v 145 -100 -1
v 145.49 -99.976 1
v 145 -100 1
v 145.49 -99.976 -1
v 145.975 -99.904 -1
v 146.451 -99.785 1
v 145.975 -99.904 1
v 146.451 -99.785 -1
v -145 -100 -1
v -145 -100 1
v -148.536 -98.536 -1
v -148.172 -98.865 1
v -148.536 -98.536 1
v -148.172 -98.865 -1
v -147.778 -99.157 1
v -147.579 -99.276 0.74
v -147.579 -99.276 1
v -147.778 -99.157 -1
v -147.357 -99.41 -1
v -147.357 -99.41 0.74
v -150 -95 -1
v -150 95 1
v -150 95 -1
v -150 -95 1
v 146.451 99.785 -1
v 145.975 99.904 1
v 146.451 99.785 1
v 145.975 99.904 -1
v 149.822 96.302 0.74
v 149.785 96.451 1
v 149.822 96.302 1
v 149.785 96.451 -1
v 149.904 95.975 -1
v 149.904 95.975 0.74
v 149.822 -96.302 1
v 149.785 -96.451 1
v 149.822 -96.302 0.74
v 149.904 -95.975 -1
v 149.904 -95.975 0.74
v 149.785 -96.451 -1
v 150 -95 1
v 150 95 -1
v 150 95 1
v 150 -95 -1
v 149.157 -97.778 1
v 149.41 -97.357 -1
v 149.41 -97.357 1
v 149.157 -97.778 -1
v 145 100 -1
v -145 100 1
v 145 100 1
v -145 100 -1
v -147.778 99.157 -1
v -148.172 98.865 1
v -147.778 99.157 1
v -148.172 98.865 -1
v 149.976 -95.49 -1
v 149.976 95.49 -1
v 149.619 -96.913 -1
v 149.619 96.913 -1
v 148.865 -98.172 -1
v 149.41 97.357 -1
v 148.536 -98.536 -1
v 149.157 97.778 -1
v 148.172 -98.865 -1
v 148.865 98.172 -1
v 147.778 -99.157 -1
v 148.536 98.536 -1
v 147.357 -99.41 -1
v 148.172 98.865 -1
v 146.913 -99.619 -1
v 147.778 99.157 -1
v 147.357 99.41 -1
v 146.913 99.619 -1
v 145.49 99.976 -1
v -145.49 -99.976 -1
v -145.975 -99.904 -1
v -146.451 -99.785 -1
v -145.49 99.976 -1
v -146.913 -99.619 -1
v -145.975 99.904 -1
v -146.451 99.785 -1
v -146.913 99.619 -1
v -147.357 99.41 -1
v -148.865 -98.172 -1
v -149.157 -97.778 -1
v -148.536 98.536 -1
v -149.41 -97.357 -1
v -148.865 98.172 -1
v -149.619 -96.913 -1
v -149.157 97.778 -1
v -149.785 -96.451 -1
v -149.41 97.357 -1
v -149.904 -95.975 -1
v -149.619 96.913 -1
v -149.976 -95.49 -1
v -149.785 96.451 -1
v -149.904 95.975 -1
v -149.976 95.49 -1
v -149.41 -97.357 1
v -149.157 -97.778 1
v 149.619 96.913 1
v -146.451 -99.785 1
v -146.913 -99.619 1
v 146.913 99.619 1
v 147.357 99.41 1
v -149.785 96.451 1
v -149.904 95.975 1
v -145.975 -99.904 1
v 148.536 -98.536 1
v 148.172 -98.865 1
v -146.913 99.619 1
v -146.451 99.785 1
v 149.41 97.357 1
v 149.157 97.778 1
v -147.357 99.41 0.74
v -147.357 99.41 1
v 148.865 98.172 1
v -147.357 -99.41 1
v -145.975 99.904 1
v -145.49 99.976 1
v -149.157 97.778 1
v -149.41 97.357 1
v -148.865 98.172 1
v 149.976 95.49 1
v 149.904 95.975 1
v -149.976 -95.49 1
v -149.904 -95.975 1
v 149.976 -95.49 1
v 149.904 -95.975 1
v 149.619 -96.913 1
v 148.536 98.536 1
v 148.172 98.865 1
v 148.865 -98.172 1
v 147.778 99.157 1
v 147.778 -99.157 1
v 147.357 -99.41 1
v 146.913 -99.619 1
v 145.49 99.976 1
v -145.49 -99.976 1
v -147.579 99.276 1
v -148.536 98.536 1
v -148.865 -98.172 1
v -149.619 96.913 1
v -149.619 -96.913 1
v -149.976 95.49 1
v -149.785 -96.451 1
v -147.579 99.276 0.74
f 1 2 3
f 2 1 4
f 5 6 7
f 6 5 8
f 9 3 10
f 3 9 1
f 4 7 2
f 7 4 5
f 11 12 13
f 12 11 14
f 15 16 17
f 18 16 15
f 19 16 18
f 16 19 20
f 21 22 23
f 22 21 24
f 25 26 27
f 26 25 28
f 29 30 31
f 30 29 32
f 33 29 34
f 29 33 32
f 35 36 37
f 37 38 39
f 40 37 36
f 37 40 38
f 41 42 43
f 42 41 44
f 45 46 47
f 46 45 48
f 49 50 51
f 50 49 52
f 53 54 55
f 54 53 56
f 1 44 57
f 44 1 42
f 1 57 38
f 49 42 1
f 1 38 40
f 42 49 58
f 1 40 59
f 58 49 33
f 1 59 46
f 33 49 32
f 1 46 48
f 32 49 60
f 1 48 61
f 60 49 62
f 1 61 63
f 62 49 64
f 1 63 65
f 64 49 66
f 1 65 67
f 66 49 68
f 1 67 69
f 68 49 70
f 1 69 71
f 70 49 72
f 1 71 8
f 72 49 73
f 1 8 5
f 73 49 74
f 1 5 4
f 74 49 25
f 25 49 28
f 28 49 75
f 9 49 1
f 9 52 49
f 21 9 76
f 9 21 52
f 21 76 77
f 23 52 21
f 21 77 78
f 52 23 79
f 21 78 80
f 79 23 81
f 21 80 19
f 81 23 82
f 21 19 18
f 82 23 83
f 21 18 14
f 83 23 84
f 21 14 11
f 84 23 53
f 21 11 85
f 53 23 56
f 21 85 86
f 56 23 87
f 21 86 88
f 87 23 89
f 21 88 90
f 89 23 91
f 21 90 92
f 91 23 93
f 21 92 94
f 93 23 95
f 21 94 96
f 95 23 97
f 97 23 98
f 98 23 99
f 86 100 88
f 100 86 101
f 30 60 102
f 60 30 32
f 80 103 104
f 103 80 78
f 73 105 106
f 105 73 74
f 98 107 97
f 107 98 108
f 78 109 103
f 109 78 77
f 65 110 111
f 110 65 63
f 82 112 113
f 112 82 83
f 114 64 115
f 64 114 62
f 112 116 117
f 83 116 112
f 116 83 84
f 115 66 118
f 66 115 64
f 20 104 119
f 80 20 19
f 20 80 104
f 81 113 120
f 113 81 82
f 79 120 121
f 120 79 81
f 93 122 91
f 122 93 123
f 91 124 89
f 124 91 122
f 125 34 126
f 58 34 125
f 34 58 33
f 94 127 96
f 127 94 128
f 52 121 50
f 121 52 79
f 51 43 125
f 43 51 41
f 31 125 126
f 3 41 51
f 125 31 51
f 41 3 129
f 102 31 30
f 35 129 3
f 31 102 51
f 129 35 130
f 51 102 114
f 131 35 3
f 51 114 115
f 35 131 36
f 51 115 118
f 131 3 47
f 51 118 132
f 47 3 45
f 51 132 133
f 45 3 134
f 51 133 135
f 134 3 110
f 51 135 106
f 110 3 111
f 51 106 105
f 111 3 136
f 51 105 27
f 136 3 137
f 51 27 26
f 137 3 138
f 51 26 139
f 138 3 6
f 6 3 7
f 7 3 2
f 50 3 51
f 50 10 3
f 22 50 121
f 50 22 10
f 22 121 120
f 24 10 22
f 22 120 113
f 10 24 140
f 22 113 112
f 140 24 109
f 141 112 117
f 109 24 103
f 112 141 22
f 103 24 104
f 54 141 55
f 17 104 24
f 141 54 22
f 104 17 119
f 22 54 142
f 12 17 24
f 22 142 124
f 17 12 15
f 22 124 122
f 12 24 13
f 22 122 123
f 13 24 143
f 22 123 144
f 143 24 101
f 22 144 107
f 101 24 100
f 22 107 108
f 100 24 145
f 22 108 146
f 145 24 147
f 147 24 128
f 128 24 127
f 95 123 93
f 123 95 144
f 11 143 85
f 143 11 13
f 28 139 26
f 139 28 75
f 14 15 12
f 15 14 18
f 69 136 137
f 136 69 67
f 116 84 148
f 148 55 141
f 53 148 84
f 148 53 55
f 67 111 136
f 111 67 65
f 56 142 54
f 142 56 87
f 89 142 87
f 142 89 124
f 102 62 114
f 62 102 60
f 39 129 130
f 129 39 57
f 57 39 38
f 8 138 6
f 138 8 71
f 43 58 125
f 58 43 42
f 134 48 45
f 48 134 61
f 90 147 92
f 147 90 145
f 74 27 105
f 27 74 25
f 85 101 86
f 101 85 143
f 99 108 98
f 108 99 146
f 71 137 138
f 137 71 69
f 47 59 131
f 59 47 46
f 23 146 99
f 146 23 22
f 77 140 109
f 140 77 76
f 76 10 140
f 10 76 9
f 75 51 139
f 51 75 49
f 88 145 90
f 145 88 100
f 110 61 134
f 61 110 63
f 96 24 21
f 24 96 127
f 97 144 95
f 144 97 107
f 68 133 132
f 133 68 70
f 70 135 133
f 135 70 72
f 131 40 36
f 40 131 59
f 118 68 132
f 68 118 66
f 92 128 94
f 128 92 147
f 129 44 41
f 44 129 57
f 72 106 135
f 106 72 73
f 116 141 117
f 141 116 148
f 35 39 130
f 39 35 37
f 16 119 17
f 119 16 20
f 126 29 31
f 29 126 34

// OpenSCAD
// Sheet: carbon fiber (single connected solid with subtle weave relief)

// Parameters
sheet_length = 300; //[150:600:1]
sheet_width = 200;  //[100:400:1]
sheet_thickness = 2; //[1:4:0.1]
corner_radius = 5;  //[2.5:10:0.5]

// Weave relief (kept small but visible)
weave_pitch = 8;     // mm between weave ridges
weave_relief = 0.18; //[0.05:0.4:0.01]
weave_angle = 45;    // degrees
overlap = 0.08;      // ensures unioned solids overlap

$fn = 64;

// Rounded-rectangle prism using linear_extrude of a 2D rounded rectangle
module rounded_rect_prism(L, W, H, R) {
    R2 = min(R, min(L, W)/2 - 0.01);
    linear_extrude(height=H, center=true, convexity=10)
        offset(r=R2)
            square([max(0.01, L - 2*R2), max(0.01, W - 2*R2)], center=true);
}

// 2D diagonal ridge pattern clipped to the sheet outline (rounded rectangle)
module ridge_pattern_2d(L, W, R, pitch, strip_w, angle_deg) {
    R2 = min(R, min(L, W)/2 - 0.01);
    span = sqrt(L*L + W*W) + 2*pitch;

    intersection() {
        // Clip to rounded rectangle footprint
        offset(r=R2)
            square([max(0.01, L - 2*R2), max(0.01, W - 2*R2)], center=true);

        // Repeated strips, rotated
        rotate(angle_deg)
            union() {
                for (x = [-span : pitch : span])
                    translate([x, 0])
                        square([strip_w, 2*span], center=true);
            }
    }
}

// Main module
module carbon_fiber_sheet() {
    L = sheet_length;
    W = sheet_width;
    T = sheet_thickness;
    R = corner_radius;

    // Relief kept within thickness; ensure visible but not excessive
    relief = min(weave_relief, max(0.05, T*0.35));
    strip_w = max(0.8, weave_pitch*0.40);

    // Place relief so it is embedded into the top surface (single connected solid)
    // Relief layer spans from z = T/2 - relief - overlap  to  z = T/2 - overlap
    relief_z = T/2 - relief/2 - overlap/2;

    color([0.06, 0.06, 0.07])
    union() {
        // Base sheet with rounded corners
        rounded_rect_prism(L, W, T, R);

        // Subtle weave: two crossed ridge layers on the top surface (embedded)
        translate([0, 0, relief_z])
            linear_extrude(height=relief + overlap, center=true, convexity=10)
                ridge_pattern_2d(L, W, R, weave_pitch, strip_w, weave_angle);

        translate([0, 0, relief_z])
            linear_extrude(height=relief + overlap, center=true, convexity=10)
                ridge_pattern_2d(L, W, R, weave_pitch, strip_w, -weave_angle);
    }
}

// Render
carbon_fiber_sheet();
